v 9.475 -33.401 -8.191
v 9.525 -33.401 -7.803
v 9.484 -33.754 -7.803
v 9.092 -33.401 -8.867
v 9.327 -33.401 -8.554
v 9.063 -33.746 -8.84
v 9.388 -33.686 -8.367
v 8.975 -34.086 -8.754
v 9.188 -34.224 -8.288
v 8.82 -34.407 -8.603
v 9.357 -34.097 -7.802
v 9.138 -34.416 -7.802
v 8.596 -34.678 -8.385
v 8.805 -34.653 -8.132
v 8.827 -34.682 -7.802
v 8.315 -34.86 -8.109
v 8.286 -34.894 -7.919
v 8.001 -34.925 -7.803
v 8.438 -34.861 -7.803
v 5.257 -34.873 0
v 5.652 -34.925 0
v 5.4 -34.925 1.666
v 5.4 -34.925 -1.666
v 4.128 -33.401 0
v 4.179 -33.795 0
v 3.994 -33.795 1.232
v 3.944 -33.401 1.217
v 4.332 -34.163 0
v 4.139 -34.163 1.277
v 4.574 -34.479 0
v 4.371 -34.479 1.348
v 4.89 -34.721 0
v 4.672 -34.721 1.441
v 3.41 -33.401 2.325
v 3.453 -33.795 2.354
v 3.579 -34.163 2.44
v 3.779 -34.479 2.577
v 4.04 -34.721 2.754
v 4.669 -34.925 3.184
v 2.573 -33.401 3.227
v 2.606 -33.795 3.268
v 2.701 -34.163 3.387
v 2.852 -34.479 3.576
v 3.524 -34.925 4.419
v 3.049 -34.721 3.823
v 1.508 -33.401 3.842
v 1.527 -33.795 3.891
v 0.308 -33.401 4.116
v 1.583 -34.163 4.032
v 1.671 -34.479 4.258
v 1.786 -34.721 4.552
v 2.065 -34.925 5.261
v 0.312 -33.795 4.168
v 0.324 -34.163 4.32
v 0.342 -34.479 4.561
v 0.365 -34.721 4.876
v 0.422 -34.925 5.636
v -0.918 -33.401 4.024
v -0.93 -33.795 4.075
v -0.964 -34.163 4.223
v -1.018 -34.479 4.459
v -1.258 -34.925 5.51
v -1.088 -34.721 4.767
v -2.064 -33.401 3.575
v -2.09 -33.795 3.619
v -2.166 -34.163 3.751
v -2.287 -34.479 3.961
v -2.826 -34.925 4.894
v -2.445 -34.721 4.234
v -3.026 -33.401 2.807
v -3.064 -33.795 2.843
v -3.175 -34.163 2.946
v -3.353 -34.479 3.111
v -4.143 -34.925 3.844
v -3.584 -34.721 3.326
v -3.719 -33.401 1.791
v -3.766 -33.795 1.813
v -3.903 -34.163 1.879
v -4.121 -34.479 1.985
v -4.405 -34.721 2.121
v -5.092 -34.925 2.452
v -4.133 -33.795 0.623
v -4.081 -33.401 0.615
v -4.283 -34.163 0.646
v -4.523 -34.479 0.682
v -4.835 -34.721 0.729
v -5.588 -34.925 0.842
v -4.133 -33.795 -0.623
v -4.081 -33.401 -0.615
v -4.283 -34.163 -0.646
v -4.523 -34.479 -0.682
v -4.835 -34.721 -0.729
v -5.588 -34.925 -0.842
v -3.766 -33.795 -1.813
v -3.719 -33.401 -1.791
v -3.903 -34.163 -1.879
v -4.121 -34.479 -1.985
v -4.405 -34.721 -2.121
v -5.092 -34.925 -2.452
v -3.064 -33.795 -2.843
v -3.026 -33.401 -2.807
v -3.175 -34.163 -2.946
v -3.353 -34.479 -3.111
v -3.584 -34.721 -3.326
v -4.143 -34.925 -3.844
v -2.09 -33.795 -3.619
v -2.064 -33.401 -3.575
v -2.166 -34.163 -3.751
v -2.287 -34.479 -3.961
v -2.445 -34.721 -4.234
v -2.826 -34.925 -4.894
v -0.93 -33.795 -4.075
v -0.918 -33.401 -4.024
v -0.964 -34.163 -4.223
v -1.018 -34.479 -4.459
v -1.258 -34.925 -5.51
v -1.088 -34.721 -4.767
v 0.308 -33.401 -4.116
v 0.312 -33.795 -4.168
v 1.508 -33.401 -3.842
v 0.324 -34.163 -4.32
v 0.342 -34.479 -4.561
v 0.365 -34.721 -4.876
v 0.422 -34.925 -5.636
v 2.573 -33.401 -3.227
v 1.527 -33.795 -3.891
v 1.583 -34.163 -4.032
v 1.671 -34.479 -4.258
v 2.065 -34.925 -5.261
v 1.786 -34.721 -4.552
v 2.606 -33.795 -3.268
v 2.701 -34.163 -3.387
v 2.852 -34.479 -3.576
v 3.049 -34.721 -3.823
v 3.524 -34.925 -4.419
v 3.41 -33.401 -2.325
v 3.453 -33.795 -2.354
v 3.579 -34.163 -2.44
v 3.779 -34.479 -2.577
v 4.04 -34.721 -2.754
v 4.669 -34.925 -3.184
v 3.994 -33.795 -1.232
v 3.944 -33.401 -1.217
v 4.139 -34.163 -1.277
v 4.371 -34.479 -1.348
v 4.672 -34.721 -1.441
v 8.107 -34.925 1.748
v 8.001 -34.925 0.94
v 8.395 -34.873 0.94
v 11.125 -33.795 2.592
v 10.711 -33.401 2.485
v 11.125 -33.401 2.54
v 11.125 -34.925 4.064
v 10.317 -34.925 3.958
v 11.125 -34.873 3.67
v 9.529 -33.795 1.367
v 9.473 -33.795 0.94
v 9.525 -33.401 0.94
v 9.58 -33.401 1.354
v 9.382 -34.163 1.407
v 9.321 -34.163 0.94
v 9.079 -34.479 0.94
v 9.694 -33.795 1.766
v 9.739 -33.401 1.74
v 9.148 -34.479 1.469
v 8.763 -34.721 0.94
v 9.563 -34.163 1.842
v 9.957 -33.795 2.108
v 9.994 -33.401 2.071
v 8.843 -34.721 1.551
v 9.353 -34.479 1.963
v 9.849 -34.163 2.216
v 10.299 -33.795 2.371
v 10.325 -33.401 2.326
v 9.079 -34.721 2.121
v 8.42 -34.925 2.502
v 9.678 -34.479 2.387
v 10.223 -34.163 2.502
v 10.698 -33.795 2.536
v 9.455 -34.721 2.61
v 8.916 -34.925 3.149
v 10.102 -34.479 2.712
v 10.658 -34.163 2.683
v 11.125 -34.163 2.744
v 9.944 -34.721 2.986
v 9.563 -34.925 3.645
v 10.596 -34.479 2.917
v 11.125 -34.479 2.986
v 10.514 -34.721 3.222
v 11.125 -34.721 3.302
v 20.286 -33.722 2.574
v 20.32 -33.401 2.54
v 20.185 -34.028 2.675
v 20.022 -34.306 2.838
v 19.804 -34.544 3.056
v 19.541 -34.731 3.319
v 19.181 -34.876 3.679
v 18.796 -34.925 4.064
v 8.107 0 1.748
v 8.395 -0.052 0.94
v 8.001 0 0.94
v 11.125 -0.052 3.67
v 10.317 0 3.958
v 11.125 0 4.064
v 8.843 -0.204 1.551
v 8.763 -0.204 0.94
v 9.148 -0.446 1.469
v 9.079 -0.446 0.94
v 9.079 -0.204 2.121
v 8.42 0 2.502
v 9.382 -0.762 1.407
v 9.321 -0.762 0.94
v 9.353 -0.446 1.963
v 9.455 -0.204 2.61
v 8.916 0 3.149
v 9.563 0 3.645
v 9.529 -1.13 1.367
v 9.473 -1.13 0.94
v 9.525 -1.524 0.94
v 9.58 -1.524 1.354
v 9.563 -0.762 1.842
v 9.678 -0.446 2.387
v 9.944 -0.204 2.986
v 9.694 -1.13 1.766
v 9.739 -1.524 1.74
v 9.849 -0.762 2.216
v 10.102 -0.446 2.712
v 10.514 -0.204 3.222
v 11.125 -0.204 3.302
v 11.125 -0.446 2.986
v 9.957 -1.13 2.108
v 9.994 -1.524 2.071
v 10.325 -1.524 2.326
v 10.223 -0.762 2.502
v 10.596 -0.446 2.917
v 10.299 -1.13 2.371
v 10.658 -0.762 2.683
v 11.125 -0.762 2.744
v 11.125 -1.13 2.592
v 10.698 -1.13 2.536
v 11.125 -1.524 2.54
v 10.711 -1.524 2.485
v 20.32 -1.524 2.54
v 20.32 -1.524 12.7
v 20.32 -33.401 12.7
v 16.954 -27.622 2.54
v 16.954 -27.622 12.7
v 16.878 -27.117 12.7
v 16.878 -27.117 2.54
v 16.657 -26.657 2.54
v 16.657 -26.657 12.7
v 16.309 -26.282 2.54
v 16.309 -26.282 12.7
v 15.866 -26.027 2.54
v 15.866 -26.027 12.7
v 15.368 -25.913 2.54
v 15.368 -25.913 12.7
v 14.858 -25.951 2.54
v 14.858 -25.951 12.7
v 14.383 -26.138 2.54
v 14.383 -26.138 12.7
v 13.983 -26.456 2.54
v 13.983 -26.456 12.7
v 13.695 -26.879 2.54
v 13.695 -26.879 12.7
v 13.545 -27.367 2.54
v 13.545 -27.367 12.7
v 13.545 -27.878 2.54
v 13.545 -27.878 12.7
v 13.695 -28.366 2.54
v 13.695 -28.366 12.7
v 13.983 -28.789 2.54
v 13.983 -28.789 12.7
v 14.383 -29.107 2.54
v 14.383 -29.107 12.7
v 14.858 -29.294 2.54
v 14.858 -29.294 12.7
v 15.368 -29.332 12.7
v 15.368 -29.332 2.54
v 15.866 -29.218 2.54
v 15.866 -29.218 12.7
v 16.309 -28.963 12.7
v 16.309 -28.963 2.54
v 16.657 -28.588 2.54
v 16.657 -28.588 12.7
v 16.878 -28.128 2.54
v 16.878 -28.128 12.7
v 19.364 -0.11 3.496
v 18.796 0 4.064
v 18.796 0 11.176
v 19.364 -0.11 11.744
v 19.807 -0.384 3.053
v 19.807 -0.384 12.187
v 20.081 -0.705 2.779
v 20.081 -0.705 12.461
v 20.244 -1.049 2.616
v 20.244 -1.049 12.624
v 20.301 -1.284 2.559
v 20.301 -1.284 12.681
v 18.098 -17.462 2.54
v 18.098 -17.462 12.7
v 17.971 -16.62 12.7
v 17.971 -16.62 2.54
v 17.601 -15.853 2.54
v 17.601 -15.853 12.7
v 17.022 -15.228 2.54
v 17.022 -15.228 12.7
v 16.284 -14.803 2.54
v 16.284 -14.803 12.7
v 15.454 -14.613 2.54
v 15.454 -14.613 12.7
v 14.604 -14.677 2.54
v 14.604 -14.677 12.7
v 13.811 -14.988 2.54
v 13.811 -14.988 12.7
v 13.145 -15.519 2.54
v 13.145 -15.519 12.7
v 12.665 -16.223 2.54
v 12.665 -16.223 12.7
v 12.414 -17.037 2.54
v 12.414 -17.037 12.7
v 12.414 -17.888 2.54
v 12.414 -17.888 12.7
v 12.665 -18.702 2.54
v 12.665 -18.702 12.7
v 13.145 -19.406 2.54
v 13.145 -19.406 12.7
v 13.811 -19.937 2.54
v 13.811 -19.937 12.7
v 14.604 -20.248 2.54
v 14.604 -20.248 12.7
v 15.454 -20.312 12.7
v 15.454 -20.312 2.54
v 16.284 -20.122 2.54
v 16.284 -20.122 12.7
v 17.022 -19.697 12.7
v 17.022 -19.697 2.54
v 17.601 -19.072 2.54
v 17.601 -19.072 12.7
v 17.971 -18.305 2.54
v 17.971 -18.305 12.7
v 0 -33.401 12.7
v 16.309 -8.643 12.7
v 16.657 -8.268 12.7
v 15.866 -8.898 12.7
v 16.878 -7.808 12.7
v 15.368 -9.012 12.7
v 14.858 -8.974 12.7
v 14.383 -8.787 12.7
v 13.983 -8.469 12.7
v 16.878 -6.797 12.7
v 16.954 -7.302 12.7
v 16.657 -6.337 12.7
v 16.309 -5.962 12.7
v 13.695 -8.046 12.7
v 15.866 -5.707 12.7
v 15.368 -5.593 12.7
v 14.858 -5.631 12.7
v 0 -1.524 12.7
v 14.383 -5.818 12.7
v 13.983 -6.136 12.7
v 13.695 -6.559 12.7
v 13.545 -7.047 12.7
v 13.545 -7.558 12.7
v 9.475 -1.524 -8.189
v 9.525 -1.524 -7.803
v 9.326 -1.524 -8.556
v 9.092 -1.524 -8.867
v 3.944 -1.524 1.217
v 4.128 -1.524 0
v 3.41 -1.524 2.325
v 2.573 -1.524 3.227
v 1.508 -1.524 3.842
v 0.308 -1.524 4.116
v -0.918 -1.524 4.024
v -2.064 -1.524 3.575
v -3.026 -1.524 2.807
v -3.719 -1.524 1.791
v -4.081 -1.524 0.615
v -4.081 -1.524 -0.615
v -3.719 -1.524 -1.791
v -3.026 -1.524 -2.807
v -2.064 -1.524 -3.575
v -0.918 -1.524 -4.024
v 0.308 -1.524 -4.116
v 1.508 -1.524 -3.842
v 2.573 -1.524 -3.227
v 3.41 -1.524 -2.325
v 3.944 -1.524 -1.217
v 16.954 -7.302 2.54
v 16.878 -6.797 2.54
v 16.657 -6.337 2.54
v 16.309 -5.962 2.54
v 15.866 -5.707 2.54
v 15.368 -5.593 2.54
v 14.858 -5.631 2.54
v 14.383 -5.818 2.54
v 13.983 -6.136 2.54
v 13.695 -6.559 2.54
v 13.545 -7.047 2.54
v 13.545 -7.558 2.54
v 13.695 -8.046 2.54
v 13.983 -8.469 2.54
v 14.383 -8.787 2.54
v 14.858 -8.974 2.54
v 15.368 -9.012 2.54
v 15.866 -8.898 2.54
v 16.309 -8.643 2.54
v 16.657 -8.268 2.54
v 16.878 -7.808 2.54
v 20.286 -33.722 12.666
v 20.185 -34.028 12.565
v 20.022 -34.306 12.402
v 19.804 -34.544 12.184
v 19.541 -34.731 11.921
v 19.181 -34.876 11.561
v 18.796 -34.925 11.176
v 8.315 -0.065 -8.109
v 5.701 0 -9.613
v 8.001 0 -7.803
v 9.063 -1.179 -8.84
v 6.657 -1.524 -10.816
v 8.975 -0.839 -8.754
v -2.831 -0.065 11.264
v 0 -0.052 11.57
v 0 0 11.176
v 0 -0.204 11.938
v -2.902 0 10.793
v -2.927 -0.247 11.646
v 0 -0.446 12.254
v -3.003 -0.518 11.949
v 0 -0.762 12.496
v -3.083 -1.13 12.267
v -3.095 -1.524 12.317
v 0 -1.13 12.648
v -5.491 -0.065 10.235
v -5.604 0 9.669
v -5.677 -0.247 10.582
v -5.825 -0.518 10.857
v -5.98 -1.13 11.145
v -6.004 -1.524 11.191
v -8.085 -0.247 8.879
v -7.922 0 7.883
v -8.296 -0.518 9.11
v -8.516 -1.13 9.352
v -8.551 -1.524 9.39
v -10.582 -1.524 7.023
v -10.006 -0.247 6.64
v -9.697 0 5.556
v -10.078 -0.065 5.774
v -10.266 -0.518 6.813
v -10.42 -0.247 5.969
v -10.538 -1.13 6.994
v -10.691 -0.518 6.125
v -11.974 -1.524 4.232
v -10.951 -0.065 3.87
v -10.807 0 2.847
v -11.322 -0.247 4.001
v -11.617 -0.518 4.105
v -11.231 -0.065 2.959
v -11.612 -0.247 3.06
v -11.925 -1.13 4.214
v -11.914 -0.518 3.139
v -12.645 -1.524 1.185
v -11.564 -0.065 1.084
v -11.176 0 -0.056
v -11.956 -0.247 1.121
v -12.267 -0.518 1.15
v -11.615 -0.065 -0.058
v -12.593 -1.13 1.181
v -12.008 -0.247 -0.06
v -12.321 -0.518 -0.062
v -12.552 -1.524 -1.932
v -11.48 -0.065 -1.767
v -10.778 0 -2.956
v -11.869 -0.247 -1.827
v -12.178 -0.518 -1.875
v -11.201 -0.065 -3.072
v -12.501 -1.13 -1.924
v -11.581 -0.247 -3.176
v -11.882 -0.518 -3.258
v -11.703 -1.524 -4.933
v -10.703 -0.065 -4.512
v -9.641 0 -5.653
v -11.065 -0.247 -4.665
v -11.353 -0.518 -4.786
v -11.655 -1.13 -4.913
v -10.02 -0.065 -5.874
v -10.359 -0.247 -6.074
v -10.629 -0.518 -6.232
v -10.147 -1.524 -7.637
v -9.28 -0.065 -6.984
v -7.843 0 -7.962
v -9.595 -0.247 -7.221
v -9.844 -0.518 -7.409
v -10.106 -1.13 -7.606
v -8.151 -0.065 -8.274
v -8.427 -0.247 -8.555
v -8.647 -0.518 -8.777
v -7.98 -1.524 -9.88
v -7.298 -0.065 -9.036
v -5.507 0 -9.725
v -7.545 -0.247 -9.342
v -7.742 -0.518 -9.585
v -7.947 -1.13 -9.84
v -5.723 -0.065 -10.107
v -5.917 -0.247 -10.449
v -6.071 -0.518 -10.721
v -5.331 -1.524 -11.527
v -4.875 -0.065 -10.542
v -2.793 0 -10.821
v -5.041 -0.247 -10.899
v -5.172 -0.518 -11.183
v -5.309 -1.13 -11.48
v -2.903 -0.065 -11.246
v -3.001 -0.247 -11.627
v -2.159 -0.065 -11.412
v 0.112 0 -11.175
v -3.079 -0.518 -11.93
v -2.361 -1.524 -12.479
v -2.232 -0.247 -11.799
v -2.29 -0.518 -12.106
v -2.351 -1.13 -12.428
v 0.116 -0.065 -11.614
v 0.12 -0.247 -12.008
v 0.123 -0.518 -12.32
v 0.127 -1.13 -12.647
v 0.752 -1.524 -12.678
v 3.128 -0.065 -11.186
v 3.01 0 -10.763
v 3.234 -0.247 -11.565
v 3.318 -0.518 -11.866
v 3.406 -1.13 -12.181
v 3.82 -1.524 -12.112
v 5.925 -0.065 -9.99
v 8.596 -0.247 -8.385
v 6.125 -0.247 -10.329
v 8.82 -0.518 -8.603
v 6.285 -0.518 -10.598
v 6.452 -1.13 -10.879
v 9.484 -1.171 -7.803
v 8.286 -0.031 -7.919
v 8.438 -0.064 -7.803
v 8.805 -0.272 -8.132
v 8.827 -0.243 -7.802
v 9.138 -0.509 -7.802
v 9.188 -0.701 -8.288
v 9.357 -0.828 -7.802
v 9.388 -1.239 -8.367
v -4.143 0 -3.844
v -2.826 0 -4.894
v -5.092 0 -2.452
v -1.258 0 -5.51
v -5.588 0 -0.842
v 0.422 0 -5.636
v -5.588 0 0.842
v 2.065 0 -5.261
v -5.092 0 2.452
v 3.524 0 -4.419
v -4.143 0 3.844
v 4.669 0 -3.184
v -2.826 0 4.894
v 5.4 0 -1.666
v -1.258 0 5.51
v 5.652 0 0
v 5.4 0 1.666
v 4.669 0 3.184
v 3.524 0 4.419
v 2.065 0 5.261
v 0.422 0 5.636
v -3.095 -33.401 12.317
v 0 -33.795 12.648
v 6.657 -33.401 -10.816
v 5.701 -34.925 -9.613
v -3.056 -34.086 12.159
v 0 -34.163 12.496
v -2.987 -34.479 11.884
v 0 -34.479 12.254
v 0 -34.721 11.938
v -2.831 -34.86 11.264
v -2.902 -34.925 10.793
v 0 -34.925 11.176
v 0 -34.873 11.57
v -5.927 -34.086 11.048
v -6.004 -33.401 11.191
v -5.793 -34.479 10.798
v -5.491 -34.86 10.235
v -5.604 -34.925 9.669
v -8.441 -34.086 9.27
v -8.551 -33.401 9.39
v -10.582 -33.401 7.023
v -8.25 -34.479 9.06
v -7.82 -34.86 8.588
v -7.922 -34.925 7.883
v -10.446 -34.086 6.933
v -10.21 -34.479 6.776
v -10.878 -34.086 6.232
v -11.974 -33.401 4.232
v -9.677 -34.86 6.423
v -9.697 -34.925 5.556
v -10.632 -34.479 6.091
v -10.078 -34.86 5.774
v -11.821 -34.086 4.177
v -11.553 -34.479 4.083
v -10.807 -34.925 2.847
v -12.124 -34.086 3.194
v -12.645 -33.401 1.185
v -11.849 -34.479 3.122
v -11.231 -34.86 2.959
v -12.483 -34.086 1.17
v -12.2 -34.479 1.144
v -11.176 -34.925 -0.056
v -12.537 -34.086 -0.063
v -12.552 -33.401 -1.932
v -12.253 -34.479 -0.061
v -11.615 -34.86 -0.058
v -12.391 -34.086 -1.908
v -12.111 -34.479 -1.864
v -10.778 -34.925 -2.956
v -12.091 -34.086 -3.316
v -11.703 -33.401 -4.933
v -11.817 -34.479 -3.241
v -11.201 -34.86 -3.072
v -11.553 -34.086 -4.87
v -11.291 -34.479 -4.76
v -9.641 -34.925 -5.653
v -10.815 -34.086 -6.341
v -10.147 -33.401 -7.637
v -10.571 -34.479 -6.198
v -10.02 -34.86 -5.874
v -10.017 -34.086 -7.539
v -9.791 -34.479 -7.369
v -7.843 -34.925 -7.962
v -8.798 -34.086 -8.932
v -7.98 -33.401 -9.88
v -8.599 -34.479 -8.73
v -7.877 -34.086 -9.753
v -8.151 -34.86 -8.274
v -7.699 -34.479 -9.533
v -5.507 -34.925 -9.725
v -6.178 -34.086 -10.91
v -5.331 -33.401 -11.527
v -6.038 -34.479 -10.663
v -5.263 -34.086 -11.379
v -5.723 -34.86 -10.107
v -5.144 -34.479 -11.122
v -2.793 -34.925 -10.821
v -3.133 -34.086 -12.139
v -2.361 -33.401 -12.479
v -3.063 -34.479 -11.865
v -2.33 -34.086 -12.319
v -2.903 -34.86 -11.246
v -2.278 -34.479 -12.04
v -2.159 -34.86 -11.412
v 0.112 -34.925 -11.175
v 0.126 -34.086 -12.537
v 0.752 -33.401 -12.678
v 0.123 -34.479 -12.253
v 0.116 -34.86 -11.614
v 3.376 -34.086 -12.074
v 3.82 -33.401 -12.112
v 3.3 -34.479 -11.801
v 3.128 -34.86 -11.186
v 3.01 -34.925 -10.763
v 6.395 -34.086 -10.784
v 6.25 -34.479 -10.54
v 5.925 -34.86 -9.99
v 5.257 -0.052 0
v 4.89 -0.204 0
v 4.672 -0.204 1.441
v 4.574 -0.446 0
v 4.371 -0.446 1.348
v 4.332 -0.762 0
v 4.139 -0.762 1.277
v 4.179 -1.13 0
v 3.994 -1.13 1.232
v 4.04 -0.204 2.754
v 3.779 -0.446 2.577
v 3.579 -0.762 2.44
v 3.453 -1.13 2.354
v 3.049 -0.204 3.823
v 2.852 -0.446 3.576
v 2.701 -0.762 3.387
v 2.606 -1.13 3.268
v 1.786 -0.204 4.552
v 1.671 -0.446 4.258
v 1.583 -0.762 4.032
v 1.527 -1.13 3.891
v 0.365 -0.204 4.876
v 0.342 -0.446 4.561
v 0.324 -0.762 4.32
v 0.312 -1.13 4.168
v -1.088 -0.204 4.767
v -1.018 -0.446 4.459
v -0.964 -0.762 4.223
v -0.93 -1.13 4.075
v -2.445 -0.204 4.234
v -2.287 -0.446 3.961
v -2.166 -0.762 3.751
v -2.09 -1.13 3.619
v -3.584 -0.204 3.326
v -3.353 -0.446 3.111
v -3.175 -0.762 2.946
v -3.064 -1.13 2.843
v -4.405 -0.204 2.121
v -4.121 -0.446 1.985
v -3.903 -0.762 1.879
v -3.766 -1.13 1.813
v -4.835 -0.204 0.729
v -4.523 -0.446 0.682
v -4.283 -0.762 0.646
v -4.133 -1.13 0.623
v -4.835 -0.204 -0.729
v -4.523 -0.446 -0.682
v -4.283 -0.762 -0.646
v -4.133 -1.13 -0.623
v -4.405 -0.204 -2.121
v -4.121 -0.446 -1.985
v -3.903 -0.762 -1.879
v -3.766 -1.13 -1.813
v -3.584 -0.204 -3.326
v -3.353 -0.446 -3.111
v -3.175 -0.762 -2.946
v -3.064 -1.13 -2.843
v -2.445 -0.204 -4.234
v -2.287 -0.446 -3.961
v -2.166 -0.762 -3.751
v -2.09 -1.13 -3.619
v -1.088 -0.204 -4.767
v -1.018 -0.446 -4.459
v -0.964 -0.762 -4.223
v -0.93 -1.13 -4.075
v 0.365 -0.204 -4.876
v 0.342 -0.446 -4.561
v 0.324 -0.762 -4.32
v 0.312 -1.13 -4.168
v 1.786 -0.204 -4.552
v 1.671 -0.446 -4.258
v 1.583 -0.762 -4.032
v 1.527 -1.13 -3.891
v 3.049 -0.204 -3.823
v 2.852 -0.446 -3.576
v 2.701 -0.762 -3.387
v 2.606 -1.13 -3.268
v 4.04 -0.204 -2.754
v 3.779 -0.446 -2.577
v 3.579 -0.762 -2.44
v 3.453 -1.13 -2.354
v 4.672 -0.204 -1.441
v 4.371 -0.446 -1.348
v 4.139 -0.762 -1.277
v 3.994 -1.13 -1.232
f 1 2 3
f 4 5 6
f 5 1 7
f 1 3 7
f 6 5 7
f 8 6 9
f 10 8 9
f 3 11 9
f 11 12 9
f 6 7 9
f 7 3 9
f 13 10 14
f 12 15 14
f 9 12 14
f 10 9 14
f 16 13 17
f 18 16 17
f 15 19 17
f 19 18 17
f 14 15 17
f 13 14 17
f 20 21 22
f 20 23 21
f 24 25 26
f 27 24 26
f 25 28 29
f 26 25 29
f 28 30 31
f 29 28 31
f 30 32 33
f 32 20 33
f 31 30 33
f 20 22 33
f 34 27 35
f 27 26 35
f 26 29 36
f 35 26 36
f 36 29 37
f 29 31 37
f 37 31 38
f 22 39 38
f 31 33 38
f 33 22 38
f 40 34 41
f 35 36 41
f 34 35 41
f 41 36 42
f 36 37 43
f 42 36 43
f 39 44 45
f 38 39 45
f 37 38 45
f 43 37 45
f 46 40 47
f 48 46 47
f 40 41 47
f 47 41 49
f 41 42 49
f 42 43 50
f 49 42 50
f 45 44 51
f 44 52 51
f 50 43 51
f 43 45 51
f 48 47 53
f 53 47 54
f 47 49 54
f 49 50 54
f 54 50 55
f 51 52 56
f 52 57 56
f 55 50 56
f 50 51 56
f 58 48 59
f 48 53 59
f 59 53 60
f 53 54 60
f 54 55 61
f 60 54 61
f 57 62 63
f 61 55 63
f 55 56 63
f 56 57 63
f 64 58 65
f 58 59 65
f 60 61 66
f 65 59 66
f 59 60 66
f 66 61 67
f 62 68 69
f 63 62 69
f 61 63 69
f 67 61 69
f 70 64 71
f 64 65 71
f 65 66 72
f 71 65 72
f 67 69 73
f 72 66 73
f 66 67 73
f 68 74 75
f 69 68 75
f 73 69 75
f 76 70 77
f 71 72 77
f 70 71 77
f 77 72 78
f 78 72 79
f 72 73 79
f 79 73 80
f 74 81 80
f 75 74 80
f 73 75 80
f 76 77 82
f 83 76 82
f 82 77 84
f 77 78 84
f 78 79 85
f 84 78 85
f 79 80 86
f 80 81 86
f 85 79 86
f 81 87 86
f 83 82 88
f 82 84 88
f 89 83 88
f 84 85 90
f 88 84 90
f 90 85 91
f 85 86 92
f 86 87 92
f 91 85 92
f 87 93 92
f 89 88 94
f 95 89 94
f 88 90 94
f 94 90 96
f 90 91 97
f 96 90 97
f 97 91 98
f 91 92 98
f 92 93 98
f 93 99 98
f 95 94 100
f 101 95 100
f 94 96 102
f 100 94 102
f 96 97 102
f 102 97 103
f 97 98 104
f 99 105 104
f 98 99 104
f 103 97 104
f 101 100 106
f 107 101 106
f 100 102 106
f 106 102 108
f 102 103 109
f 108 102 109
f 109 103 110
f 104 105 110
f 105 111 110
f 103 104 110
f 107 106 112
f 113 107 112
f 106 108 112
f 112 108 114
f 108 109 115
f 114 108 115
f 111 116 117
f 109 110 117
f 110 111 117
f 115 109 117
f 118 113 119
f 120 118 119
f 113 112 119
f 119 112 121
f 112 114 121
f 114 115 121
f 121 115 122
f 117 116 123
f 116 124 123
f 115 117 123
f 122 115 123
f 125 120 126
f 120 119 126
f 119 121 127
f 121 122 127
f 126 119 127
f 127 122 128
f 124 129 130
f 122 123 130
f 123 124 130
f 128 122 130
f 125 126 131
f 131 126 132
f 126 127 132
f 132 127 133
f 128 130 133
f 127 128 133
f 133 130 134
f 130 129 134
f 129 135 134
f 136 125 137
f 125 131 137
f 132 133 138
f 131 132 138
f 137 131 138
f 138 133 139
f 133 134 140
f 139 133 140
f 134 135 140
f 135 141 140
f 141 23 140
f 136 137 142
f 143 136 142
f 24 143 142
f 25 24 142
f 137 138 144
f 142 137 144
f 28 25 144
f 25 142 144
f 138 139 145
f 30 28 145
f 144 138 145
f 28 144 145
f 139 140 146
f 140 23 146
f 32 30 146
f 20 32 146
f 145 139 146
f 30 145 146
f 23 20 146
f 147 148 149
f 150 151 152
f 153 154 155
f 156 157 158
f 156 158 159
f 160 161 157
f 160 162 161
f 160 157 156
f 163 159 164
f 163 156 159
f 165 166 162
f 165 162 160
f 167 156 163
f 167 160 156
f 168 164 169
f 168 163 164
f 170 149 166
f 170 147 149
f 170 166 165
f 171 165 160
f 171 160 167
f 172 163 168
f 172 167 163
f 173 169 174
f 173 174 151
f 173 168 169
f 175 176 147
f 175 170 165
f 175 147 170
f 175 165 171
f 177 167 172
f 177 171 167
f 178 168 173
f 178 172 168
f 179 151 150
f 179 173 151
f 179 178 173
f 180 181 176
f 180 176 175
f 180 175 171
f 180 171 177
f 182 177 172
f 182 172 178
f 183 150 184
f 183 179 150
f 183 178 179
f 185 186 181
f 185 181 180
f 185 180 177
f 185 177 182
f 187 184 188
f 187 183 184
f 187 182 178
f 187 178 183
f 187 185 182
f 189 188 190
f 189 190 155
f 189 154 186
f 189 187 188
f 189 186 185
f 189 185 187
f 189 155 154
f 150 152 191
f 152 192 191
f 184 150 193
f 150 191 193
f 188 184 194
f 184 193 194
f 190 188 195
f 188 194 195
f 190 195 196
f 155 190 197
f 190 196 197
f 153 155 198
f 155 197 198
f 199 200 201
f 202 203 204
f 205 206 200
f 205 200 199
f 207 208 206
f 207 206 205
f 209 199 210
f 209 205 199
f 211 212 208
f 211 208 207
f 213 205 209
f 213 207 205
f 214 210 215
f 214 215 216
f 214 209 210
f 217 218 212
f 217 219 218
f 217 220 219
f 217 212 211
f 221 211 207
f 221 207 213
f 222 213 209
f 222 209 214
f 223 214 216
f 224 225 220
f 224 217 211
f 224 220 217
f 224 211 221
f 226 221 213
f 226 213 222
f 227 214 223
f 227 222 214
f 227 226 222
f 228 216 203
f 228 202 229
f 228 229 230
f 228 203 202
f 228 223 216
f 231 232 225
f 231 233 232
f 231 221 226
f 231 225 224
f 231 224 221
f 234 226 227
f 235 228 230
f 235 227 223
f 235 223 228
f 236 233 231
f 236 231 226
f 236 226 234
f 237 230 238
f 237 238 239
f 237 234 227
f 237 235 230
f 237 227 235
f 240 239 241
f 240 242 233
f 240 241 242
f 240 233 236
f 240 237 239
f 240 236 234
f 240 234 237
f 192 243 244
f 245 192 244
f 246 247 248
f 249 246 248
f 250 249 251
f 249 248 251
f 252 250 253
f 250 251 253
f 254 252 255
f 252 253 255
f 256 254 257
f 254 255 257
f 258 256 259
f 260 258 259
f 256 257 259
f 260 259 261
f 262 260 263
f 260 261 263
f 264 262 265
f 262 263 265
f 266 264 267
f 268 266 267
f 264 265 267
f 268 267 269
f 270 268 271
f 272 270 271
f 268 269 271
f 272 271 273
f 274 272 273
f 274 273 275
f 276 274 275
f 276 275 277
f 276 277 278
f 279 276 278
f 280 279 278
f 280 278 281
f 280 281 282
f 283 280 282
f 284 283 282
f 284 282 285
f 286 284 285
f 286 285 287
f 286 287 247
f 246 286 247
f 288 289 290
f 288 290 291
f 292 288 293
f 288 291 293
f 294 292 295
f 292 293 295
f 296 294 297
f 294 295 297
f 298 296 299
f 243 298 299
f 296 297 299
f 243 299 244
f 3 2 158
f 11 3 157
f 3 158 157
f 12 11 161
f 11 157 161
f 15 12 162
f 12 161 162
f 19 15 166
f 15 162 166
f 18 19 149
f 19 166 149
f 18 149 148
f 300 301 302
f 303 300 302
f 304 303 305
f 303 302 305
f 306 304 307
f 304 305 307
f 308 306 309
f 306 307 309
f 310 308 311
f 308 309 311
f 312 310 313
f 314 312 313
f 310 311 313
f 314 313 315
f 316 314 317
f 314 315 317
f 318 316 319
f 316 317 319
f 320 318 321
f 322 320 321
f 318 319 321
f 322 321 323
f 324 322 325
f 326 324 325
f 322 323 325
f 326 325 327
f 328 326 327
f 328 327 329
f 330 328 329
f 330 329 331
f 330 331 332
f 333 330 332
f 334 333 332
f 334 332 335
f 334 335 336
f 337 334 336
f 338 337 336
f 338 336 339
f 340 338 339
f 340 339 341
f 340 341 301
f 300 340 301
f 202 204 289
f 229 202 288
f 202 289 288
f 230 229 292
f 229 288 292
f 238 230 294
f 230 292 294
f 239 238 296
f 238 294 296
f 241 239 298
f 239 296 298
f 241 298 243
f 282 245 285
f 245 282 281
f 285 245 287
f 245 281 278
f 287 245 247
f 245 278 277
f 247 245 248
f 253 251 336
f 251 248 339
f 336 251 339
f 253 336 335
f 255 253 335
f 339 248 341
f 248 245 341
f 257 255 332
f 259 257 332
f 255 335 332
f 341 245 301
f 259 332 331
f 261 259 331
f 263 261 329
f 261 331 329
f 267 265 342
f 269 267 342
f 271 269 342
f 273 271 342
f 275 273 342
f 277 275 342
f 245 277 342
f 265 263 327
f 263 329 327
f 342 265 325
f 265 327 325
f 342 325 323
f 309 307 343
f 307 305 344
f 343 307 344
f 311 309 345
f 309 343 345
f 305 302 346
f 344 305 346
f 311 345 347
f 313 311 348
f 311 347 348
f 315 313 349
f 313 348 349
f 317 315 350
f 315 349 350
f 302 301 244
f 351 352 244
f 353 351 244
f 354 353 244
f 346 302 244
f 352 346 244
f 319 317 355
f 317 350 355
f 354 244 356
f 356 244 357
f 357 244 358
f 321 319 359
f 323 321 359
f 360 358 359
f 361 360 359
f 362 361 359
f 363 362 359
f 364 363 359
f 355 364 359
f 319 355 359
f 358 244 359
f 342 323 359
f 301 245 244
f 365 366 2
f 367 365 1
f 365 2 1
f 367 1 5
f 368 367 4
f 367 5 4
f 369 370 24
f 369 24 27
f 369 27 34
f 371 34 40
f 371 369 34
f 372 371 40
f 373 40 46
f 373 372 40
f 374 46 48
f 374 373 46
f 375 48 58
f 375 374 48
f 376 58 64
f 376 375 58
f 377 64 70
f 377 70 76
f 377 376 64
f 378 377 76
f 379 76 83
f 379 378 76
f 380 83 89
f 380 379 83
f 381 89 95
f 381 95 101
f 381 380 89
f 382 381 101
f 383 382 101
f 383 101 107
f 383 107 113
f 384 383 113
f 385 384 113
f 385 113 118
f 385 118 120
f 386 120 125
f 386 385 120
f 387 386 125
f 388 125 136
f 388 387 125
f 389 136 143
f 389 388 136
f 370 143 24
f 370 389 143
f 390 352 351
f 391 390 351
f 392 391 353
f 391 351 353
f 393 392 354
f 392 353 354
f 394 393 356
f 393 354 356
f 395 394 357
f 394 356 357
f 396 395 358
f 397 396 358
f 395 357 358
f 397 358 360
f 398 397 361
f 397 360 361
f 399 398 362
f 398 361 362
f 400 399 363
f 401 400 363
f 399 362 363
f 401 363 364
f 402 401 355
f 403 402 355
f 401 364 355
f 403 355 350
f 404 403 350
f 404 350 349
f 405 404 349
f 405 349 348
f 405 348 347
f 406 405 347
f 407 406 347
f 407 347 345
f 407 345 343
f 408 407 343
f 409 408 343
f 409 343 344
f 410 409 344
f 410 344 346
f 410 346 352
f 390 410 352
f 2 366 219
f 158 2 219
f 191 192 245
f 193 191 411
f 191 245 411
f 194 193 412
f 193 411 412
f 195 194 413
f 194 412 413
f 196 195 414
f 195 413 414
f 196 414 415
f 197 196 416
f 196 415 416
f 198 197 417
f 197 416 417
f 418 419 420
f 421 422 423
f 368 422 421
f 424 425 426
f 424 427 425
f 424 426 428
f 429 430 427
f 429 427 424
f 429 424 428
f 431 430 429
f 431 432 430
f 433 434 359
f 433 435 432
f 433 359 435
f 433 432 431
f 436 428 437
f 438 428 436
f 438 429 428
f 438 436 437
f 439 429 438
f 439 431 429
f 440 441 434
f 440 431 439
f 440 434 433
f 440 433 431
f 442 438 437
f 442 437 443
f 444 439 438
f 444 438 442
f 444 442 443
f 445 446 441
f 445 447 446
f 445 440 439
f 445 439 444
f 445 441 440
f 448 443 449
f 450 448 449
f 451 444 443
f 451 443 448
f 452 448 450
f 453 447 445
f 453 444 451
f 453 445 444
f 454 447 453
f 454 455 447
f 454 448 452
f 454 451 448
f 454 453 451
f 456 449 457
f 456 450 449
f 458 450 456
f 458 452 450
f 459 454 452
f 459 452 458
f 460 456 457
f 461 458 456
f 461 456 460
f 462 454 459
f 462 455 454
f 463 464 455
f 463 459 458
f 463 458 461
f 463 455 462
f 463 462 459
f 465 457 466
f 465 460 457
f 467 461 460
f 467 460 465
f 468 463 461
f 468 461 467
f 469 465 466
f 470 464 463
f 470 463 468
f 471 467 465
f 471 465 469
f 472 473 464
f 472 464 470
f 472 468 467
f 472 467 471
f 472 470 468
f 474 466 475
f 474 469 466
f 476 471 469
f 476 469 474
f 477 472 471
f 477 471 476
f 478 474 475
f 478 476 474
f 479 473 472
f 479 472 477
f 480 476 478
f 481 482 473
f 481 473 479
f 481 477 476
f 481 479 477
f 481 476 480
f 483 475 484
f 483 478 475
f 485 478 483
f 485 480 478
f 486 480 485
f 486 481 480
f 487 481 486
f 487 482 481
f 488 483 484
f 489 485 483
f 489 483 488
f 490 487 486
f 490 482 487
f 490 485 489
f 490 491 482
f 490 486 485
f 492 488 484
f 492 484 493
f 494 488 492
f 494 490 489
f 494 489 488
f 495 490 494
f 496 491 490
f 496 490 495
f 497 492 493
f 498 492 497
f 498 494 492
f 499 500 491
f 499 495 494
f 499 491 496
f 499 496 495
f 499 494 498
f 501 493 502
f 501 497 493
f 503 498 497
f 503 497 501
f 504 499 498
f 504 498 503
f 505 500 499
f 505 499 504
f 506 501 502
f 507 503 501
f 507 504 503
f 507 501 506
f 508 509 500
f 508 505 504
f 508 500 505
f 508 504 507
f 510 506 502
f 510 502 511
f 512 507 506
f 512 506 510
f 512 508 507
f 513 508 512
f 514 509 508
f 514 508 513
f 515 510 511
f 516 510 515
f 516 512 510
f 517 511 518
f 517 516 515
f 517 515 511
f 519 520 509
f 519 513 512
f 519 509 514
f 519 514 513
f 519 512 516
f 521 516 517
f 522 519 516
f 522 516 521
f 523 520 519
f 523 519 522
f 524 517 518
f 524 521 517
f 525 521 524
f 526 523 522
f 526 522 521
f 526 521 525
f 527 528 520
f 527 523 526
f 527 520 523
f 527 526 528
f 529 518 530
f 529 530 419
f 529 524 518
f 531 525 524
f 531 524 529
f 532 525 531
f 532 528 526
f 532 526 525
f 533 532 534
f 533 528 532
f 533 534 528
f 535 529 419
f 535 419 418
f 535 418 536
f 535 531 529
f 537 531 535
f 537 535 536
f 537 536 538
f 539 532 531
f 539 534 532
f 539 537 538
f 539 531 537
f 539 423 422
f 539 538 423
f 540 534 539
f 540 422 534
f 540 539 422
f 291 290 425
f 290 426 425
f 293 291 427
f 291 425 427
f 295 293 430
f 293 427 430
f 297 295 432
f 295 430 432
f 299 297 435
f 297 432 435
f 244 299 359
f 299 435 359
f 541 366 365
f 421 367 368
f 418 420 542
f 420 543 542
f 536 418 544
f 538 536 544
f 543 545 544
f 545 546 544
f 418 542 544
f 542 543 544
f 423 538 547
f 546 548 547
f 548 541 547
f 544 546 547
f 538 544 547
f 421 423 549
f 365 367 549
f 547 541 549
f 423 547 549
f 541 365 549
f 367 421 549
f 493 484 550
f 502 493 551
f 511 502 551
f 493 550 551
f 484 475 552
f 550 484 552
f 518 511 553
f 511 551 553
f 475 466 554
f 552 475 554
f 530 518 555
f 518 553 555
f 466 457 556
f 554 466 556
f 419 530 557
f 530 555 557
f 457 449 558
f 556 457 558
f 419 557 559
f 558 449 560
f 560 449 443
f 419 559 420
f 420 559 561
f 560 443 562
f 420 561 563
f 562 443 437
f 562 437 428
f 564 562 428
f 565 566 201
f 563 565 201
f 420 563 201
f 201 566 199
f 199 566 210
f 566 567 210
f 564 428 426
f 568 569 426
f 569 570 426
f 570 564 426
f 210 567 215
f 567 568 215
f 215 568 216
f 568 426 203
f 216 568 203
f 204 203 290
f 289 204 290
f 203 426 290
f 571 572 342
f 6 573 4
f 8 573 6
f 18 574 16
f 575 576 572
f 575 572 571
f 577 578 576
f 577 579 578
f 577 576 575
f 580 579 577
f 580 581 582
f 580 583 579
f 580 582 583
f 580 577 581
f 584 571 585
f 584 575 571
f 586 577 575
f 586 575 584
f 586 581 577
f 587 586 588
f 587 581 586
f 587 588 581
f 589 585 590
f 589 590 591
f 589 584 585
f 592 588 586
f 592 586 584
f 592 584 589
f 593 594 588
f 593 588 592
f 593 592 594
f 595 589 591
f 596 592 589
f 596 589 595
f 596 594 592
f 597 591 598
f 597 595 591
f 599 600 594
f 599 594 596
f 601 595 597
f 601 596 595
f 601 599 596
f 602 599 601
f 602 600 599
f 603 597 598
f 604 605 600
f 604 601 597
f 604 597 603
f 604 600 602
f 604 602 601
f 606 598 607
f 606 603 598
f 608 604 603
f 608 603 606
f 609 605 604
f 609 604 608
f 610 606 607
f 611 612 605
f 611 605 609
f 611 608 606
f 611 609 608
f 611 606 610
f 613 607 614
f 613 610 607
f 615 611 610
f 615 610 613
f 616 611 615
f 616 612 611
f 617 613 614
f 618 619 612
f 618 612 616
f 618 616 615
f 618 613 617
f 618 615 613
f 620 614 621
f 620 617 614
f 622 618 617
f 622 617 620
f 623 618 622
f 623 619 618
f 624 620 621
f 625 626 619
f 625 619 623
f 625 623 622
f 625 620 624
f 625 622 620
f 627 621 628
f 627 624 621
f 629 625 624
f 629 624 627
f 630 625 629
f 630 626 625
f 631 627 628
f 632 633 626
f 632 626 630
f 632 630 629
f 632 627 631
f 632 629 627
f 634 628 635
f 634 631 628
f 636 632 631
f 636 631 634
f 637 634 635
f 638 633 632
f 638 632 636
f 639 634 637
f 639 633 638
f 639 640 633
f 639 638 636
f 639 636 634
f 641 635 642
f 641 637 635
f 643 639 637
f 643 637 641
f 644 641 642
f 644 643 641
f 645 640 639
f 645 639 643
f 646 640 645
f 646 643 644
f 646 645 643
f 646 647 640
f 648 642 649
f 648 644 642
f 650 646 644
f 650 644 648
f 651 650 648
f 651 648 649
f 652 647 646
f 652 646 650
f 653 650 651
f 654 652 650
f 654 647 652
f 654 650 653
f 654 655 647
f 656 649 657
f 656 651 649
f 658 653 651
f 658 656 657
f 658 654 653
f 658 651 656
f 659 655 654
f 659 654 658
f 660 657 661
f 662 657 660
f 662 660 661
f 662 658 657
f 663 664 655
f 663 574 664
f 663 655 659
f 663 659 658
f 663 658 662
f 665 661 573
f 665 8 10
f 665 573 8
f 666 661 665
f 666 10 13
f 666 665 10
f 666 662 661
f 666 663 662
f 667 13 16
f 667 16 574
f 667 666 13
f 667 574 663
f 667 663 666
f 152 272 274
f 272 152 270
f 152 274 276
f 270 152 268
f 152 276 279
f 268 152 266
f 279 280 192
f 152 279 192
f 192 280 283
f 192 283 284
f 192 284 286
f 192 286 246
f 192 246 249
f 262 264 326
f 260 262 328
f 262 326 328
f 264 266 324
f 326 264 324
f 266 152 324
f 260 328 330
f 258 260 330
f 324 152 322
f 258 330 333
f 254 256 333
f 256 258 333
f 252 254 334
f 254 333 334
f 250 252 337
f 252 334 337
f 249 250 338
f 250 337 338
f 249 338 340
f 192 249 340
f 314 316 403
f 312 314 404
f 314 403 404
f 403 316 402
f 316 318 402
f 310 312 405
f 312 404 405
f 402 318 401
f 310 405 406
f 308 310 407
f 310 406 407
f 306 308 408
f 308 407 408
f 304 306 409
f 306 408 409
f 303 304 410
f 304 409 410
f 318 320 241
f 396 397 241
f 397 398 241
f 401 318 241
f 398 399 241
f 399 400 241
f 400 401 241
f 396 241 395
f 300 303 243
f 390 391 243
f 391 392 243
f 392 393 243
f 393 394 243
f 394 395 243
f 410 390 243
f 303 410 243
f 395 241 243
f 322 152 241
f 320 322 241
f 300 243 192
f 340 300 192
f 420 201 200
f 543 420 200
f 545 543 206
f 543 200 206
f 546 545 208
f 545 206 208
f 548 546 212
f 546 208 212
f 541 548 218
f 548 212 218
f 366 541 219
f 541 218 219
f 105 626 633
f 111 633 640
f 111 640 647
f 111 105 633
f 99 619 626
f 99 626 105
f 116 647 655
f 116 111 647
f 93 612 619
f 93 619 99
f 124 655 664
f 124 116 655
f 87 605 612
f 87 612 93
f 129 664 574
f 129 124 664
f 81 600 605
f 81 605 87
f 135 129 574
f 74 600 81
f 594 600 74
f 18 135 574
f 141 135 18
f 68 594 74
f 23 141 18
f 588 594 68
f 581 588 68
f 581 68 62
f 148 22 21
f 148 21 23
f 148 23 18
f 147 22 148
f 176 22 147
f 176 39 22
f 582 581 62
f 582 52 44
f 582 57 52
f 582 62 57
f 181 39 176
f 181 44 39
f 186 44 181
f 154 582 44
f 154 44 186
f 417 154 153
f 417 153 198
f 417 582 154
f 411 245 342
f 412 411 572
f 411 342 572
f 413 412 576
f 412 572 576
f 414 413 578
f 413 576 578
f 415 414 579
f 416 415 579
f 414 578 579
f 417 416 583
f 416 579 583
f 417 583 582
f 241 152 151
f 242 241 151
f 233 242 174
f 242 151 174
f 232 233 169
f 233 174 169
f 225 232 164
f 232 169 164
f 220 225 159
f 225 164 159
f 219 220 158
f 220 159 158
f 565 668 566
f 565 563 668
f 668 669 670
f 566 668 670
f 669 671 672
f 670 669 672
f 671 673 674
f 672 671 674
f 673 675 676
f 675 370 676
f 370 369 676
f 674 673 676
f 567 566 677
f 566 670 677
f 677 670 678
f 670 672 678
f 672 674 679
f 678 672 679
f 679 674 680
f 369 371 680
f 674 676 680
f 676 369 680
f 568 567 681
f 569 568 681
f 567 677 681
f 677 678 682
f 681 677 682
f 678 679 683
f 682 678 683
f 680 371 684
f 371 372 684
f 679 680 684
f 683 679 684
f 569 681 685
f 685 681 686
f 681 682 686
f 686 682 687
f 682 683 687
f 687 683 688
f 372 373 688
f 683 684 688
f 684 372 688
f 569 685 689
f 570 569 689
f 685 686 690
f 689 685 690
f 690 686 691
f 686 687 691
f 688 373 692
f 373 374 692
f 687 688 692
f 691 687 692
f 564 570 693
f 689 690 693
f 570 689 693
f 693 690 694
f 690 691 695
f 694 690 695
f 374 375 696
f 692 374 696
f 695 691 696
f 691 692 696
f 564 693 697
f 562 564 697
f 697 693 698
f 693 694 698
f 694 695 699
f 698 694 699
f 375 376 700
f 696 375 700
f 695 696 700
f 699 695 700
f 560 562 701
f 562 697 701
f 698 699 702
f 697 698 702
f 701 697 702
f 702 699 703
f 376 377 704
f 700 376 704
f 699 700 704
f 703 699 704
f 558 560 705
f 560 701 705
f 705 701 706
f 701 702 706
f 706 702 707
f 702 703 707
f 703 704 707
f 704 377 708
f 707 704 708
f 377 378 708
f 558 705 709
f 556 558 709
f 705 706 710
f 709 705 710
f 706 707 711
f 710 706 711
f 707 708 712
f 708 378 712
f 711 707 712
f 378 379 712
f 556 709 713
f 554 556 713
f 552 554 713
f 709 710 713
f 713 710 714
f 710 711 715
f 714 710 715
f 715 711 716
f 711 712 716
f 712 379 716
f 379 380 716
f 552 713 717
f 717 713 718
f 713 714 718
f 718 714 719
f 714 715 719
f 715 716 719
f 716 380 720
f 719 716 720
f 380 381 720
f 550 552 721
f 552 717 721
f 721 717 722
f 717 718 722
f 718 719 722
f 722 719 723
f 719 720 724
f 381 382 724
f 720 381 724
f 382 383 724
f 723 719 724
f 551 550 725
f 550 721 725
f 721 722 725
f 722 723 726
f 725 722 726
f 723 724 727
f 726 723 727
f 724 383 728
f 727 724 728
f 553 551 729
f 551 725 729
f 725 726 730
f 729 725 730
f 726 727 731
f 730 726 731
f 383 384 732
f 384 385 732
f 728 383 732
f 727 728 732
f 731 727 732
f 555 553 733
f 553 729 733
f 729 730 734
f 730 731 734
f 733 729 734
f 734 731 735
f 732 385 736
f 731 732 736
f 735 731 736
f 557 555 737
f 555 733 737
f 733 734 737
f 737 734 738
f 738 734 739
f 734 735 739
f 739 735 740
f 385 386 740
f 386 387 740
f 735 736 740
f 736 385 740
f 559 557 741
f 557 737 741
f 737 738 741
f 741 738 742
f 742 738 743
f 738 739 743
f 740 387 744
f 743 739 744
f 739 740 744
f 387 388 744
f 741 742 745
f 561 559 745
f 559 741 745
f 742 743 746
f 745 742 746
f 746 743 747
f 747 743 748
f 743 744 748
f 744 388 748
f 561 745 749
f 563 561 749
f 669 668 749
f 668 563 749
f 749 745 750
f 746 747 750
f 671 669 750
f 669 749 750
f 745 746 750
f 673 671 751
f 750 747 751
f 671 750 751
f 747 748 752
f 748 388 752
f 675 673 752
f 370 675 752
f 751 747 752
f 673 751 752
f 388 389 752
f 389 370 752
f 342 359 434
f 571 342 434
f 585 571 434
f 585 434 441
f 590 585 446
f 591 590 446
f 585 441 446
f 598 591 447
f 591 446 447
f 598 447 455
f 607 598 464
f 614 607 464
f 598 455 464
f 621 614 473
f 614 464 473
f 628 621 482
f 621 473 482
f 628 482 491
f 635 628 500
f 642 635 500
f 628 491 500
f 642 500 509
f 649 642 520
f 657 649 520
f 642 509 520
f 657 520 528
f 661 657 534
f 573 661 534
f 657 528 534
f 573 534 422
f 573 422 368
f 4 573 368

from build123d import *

# Parameters (mm, degrees)
F0_R     = 4.1275
F1_DEPTH = 34.925
F2_R     = 2.8575
F2_R_2   = 1.7145
F3_DEPTH = 25.4
F4_R     = 1.6002
F5_R     = 1.524
F6_R     = 1.524
F7_R     = 1.524


with BuildPart() as f1:
    # F0 (on Front) → F1 (new body)
    with BuildSketch(Plane.XZ):
        with BuildLine():
            Line((20.32, 12.7), (0, 12.7))
            ThreePointArc((0, 12.7), (-11.57526, -5.22526), (9.525, -8.40026))
            Line((9.525, -8.40026), (9.525, 2.54))
            Line((9.525, 2.54), (12.443408, 2.54))
            Line((12.443408, 2.54), (20.32, 2.54))
            Line((20.32, 2.54), (20.32, 12.7))
        make_face()
        Circle(F0_R, mode=Mode.SUBTRACT)
    extrude(amount=F1_DEPTH)

    # F2 (on face) → F3 (cut)
    with BuildSketch(Plane.XY.offset(12.7)):
        with Locations((15.24, -17.4625)):
            Circle(F2_R)
        with Locations((15.24, -27.6225)):
            Circle(F2_R_2)
        with Locations((15.24, -7.3025)):
            Circle(F2_R_2)
    extrude(amount=-F3_DEPTH, mode=Mode.SUBTRACT)

    # F4
    f4_edges = [f1.edges().sort_by_distance(p)[0] for p in [
        (9.525, -17.4625, 2.54),
    ]]
    fillet(f4_edges, radius=F4_R)

    # F5
    f5_edges = [f1.edges().sort_by_distance(p)[0] for p in [
        (9.525, -34.925, -3.73023),
        (9.993688, -34.925, 2.071312),
        (-11.57526, -34.925, -5.22526),
        (15.7226, -34.925, 2.54),
        (10.16, -34.925, 12.7),
        (20.32, -34.925, 7.62),
        (-4.1275, -34.925, 0),
    ]]
    fillet(f5_edges, radius=F5_R)

    # F6
    f6_edges = [f1.edges().sort_by_distance(p)[0] for p in [
        (9.525, 0, -3.73023),
        (9.993688, 0, 2.071312),
        (-11.57526, 0, -5.22526),
        (15.7226, 0, 2.54),
        (10.16, 0, 12.7),
        (20.32, 0, 7.62),
        (-4.1275, 0, 0),
    ]]
    fillet(f6_edges, radius=F6_R)

    # F7
    f7_edges = [f1.edges().sort_by_distance(p)[0] for p in [
        (9.525, -17.4625, -8.40026),
    ]]
    fillet(f7_edges, radius=F7_R)


solid = f1.part
